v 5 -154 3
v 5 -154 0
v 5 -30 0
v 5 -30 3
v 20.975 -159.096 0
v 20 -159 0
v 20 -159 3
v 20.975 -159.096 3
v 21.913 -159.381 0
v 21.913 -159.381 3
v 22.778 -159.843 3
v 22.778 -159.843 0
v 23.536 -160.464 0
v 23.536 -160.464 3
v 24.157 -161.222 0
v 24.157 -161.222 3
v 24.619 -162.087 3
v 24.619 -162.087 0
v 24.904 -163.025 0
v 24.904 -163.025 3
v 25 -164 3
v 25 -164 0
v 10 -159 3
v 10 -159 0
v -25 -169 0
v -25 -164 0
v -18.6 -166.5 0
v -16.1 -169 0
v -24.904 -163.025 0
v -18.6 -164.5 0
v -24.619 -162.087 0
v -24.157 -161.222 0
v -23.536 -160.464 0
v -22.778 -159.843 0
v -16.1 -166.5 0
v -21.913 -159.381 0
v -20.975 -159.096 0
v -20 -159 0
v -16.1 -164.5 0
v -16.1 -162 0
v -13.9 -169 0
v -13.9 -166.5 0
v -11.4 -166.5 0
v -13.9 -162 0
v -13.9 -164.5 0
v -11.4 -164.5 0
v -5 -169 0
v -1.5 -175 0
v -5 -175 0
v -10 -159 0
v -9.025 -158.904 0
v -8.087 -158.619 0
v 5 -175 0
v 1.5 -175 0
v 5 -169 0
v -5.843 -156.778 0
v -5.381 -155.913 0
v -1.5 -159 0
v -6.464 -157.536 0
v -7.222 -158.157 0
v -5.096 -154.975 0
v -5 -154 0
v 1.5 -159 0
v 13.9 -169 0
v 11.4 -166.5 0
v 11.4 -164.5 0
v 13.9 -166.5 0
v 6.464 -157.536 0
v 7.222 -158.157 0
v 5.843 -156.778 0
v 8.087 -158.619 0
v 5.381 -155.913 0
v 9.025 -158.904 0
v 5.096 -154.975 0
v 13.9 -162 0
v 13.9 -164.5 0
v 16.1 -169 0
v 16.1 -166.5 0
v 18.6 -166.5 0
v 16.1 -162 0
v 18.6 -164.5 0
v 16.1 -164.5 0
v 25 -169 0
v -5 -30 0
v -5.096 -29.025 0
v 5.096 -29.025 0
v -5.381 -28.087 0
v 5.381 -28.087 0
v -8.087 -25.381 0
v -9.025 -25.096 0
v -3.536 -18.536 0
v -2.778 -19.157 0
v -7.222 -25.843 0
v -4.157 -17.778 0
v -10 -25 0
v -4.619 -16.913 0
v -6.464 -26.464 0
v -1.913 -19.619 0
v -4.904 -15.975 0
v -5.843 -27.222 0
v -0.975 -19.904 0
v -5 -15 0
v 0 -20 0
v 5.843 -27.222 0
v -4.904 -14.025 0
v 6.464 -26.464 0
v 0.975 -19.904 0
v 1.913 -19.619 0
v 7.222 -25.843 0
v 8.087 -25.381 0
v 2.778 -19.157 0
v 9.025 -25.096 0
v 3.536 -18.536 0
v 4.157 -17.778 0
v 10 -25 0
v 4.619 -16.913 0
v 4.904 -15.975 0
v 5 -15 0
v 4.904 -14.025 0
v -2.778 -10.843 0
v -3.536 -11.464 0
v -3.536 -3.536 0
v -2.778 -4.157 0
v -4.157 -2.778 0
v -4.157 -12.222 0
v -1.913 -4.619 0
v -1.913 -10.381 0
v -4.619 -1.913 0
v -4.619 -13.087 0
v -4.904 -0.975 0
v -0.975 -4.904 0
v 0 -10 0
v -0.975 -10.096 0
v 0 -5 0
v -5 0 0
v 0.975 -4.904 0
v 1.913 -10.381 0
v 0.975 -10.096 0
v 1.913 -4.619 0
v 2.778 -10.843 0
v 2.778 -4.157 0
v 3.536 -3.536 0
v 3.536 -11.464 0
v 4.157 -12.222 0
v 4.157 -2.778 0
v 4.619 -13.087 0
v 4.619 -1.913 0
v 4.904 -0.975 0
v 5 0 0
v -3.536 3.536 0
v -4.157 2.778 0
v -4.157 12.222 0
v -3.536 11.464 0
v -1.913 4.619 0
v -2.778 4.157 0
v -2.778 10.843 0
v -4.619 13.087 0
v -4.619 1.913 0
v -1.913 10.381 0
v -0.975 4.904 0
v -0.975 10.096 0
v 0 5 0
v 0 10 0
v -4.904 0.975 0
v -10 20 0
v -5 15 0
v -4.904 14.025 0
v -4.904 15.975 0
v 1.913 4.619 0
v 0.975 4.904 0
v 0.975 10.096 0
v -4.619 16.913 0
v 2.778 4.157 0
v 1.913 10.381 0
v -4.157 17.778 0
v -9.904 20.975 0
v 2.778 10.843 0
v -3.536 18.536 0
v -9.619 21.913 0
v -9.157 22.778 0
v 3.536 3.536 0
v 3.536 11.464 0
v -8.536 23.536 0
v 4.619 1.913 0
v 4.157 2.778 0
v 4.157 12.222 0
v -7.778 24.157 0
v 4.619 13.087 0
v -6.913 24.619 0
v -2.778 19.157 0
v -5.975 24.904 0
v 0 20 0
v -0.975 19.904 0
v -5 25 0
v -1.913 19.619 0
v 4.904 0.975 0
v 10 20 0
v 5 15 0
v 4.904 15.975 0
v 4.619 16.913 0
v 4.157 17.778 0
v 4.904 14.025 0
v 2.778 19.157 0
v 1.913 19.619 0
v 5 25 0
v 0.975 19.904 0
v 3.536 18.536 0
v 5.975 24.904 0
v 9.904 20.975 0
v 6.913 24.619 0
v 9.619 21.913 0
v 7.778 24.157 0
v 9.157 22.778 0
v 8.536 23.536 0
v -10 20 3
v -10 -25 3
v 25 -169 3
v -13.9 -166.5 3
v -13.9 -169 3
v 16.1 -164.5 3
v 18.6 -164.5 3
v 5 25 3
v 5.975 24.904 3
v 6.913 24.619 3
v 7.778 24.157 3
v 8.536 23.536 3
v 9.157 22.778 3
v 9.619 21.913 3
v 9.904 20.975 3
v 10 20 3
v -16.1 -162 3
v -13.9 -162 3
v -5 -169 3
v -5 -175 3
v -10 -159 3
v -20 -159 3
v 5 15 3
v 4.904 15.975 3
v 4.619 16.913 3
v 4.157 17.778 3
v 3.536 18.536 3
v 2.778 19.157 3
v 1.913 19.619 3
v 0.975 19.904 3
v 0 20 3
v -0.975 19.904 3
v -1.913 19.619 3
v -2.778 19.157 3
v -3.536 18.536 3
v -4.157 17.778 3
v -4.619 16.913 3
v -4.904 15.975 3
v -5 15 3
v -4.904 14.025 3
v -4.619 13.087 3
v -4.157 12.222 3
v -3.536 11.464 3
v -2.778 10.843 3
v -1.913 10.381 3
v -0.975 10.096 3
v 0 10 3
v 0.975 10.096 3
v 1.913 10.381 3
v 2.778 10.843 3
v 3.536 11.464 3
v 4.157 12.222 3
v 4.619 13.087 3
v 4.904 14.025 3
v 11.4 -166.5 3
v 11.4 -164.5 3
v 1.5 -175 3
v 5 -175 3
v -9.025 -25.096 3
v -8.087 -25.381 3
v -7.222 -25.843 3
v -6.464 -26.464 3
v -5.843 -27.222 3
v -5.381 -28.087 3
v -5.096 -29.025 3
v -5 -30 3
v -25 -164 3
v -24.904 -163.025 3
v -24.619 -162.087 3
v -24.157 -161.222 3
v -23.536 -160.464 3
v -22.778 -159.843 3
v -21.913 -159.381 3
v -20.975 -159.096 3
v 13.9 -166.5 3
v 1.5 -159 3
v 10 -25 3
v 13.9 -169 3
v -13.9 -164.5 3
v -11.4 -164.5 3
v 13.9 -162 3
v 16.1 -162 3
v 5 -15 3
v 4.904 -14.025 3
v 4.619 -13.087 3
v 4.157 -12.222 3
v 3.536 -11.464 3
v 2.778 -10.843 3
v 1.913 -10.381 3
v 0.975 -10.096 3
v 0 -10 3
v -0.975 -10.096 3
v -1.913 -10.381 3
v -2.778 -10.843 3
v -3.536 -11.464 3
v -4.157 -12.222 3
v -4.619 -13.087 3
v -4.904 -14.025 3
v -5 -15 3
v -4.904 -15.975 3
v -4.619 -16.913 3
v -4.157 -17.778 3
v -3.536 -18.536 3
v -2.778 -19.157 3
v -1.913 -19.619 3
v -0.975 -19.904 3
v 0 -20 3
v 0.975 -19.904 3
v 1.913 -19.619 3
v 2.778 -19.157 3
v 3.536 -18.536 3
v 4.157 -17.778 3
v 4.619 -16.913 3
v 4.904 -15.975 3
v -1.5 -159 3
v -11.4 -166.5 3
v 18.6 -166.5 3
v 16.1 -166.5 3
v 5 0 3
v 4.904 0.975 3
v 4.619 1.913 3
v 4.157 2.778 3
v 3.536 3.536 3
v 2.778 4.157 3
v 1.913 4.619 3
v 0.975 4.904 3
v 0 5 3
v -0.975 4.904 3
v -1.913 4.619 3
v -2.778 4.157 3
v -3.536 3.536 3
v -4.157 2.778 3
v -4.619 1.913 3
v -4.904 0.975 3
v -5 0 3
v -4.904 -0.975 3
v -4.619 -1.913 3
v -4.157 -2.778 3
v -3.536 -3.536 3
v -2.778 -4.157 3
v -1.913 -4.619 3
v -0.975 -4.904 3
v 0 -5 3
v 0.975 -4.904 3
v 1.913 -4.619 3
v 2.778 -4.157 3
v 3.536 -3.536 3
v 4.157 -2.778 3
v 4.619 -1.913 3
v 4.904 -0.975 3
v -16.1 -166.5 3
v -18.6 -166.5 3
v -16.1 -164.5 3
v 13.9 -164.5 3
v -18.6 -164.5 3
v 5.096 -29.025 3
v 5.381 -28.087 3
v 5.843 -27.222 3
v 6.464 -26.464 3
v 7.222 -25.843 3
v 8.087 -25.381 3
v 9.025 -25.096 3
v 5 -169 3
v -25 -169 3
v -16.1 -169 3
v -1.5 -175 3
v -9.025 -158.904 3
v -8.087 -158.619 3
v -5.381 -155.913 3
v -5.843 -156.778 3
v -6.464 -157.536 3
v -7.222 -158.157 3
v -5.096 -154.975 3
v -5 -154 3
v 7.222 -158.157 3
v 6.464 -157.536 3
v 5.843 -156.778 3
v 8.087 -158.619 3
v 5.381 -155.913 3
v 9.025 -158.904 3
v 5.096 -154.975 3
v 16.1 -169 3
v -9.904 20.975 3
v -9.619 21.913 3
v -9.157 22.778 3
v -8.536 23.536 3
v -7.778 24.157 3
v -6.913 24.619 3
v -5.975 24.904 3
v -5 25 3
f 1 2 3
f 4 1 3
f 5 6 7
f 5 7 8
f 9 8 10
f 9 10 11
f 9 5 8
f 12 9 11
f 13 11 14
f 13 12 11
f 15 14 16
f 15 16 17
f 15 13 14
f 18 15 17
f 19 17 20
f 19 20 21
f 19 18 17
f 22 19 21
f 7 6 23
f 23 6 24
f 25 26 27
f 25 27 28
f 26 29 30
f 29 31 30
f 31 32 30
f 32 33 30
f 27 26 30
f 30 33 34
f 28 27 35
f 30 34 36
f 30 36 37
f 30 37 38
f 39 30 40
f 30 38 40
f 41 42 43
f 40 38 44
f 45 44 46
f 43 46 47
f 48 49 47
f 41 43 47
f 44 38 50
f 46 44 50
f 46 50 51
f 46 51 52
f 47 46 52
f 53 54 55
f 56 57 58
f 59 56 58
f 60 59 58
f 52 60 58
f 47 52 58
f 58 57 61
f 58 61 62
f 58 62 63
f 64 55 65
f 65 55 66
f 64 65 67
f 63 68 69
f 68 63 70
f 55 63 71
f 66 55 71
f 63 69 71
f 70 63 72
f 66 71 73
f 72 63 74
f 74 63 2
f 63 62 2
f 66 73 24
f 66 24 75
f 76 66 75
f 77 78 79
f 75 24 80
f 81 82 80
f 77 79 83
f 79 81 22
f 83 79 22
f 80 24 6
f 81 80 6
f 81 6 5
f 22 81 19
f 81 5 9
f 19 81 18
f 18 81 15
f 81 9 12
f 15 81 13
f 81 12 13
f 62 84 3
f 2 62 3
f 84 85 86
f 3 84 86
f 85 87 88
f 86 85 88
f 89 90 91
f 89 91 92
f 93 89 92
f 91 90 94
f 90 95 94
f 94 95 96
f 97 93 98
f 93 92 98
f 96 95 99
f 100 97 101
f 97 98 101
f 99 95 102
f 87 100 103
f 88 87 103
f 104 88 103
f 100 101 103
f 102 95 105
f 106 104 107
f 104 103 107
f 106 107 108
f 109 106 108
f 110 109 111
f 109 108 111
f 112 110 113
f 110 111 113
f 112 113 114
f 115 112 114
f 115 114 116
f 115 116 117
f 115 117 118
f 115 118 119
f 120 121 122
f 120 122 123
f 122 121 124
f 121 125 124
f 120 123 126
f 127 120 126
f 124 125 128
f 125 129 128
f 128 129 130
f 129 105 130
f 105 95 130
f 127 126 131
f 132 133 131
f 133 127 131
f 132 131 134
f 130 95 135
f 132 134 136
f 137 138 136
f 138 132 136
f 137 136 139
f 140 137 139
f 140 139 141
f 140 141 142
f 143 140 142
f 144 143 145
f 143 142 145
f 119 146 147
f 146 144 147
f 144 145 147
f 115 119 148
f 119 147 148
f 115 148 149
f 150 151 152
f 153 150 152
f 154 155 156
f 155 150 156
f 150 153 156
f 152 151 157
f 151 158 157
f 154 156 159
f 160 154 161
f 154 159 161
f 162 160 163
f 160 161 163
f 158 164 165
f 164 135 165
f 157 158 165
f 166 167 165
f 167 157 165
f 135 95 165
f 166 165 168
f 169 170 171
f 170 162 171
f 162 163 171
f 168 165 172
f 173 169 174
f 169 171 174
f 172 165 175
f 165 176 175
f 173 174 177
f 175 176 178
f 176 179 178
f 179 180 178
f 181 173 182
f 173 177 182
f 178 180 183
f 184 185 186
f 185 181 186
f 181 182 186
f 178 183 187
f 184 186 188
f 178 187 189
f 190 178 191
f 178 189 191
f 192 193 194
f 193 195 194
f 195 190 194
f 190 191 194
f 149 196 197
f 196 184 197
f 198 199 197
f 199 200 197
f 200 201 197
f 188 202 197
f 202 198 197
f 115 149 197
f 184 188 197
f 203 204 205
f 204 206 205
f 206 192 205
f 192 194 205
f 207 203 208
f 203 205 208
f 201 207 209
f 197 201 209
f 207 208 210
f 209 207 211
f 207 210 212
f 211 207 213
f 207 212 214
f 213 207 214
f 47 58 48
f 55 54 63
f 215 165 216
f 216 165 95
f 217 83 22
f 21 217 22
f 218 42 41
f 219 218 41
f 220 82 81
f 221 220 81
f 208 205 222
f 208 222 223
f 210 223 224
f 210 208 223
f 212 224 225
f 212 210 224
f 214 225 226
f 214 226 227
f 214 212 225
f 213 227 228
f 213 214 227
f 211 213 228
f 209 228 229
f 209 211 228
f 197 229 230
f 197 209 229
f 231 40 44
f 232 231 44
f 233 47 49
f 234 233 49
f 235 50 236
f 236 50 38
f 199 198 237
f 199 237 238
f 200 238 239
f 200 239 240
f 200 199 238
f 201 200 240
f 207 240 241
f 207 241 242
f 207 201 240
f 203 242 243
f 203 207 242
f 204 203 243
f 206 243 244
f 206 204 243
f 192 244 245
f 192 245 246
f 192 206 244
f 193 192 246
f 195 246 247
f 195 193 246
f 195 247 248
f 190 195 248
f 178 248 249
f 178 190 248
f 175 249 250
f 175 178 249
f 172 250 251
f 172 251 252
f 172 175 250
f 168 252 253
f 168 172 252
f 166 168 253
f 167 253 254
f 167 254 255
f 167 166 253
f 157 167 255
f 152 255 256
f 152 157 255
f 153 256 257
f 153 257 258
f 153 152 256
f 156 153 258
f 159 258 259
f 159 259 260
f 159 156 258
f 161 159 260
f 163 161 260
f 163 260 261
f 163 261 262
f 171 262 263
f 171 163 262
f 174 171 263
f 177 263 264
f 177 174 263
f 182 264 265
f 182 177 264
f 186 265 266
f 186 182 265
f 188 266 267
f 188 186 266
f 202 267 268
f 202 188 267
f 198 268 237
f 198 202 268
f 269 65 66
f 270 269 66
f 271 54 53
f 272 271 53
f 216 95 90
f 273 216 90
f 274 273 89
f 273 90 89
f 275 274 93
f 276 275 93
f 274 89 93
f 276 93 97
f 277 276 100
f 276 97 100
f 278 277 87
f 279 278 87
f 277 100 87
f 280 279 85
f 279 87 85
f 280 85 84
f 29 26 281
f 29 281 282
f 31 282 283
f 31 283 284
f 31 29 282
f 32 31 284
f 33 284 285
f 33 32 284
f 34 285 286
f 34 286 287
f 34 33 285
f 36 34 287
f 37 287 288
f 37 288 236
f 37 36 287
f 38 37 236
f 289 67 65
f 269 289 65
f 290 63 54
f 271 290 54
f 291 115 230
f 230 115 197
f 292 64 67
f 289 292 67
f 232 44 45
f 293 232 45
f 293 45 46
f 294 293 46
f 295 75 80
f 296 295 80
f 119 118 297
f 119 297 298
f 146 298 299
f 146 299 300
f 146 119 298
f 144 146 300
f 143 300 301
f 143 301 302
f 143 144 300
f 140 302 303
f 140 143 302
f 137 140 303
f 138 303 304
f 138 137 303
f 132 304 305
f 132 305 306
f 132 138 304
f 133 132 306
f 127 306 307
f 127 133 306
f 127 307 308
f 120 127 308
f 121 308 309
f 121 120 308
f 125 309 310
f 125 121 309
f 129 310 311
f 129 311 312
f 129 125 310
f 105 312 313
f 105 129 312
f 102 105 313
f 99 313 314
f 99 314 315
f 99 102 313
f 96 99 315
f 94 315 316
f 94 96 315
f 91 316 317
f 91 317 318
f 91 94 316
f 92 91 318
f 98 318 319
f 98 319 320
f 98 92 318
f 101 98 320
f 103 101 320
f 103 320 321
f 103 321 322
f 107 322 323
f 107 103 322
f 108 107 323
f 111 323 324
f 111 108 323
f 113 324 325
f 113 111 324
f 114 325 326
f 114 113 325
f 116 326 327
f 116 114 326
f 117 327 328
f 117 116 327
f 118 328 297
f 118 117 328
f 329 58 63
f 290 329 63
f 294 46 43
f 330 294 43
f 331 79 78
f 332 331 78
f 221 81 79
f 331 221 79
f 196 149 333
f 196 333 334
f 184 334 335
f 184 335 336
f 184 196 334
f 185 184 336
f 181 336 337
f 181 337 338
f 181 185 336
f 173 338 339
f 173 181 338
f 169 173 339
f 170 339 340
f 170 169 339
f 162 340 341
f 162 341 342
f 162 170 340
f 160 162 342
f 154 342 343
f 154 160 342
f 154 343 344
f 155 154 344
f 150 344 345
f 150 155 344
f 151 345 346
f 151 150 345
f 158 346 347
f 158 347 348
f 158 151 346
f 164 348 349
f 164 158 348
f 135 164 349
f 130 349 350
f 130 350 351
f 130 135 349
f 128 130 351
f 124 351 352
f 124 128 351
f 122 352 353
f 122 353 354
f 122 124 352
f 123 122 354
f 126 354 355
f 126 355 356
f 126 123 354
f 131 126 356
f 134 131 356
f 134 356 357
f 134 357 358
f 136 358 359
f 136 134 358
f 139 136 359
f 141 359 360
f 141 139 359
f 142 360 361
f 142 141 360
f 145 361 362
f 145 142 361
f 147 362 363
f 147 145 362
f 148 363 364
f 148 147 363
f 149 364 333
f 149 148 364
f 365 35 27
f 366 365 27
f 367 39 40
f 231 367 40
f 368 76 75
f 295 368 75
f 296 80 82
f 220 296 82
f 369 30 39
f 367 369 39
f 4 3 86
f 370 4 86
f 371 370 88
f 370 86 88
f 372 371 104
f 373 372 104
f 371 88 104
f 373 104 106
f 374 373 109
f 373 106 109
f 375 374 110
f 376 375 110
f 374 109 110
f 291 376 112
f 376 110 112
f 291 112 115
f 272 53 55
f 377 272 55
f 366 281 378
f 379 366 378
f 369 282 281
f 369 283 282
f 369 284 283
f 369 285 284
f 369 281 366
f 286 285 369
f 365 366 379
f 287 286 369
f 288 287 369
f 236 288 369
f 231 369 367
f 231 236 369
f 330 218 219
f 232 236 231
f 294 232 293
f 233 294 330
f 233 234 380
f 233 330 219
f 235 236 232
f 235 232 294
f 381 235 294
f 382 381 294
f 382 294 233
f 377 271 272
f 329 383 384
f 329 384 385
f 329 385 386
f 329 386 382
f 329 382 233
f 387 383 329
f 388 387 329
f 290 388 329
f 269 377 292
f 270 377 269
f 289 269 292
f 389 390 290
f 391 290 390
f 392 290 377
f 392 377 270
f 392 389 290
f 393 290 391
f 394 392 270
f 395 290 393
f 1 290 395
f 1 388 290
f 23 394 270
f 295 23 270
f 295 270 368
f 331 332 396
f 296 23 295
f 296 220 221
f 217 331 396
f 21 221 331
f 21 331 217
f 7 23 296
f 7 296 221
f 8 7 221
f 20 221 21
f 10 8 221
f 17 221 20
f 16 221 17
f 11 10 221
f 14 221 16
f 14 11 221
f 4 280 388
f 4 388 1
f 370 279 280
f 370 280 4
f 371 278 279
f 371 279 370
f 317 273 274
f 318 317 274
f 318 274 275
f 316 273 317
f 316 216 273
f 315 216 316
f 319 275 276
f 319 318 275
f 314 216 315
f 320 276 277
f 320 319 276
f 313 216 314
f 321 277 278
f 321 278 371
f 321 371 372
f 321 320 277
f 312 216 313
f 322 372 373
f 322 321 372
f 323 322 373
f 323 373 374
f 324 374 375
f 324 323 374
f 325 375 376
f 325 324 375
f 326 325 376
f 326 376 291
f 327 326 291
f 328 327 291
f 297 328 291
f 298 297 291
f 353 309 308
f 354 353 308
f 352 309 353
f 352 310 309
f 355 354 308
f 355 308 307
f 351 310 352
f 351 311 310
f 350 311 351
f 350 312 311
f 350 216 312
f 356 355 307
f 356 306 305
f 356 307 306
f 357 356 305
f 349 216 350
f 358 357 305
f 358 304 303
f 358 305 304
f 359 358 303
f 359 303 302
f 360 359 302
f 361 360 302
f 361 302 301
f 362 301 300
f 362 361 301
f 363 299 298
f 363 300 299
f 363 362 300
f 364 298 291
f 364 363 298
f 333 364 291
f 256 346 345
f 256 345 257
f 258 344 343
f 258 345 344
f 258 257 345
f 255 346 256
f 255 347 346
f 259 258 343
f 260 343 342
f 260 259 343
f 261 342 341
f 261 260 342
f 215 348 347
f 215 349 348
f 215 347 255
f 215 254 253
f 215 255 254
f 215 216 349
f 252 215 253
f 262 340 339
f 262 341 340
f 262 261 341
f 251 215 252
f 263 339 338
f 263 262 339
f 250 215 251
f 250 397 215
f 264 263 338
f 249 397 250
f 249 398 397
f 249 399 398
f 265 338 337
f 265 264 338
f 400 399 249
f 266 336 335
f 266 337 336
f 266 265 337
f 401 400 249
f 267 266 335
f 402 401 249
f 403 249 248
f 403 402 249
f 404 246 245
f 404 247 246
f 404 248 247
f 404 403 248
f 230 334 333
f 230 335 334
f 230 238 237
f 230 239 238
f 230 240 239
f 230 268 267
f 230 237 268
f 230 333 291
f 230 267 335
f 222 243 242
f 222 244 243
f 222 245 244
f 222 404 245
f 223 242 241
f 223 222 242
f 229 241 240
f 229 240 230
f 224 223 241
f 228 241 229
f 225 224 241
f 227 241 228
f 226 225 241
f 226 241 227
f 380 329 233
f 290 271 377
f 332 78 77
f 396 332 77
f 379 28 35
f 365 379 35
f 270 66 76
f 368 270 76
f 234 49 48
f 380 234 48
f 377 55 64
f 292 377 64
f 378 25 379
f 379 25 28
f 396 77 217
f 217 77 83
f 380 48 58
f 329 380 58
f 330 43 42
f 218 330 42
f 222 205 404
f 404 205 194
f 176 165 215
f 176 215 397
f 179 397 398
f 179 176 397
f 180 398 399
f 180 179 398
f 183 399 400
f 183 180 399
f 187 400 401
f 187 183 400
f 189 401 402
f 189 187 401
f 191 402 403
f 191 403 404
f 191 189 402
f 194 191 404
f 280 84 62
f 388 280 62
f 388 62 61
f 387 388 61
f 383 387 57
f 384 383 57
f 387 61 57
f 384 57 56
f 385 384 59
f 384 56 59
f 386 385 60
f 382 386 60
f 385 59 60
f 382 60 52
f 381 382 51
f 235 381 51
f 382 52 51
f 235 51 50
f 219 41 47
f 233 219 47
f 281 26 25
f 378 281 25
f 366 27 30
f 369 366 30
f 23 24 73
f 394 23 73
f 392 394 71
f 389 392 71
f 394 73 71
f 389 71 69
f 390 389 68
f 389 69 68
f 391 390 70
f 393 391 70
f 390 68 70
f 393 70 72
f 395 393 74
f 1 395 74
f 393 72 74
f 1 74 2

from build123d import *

# Parameters (mm, degrees)
SKETCH1_R           = 5
BOSS_EXTRUDE1_DEPTH = 3
FILLET1_START       = -1
FILLET1_DEPTH       = 5
FILLET1_2_DEPTH     = 3


with BuildPart() as part:
    # Sketch1 → Boss-Extrude1 (new body)
    with BuildSketch(Plane.XY):
        Polygon((-5, -25), (-5, -159), (-25, -159), (-25, -169), (-16.1, -169), (-16.1, -166.5), (-18.6, -166.5), (-18.6, -164.5), (-16.1, -164.5), (-16.1, -162), (-13.9, -162), (-13.9, -164.5), (-11.4, -164.5), (-11.4, -166.5), (-13.9, -166.5), (-13.9, -169), (-5, -169), (-5, -175), (-1.5, -175), (-1.5, -159), (1.5, -159), (1.5, -175), (5, -175), (5, -169), (13.9, -169), (13.9, -166.5), (11.4, -166.5), (11.4, -164.5), (13.9, -164.5), (13.9, -162), (16.1, -162), (16.1, -164.5), (18.6, -164.5), (18.6, -166.5), (16.1, -166.5), (16.1, -169), (25, -169), (25, -159), (5, -159), (5, -25), (10, -25), (10, 25), (-10, 25), (-10, -25), align=None)
        with Locations((0, 15)):
            Circle(SKETCH1_R, mode=Mode.SUBTRACT)
        Circle(SKETCH1_R, mode=Mode.SUBTRACT)
        with Locations((0, -15)):
            Circle(SKETCH1_R, mode=Mode.SUBTRACT)
    extrude(amount=BOSS_EXTRUDE1_DEPTH)

    # Fillet1: read off the stored shape, not the designer's step
    # Fillet1 outline → Fillet1 (cut)
    with BuildSketch(Plane.XY.offset(FILLET1_START)):
        with BuildLine():
            Line((25, -159), (20, -159))
            ThreePointArc((20, -159), (23.535533906, -160.464466094), (25, -164))
            Line((25, -164), (25, -159))
        make_face()
        with BuildLine():
            ThreePointArc((-25, -164), (-23.535533906, -160.464466094), (-20, -159))
            Line((-20, -159), (-25, -159))
            Line((-25, -159), (-25, -164))
        make_face()
        with BuildLine():
            ThreePointArc((-10, 20), (-8.535533906, 23.535533906), (-5, 25))
            Line((-5, 25), (-10, 25))
            Line((-10, 25), (-10, 20))
        make_face()
        with BuildLine():
            ThreePointArc((5, 25), (8.535533906, 23.535533906), (10, 20))
            Line((10, 20), (10, 25))
            Line((10, 25), (5, 25))
        make_face()
    extrude(amount=FILLET1_DEPTH, mode=Mode.SUBTRACT)

    # Fillet1 2 outline → Fillet1 2 (add)
    with BuildSketch(Plane.XY):
        with BuildLine():
            Line((-5, -159), (-5, -154))
            ThreePointArc((-5, -154), (-6.464466094, -157.535533906), (-10, -159))
            Line((-10, -159), (-5, -159))
        make_face()
        with BuildLine():
            Line((-5, -25), (-10, -25))
            ThreePointArc((-10, -25), (-6.464466094, -26.464466094), (-5, -30))
            Line((-5, -30), (-5, -25))
        make_face()
        with BuildLine():
            Line((5, -25), (5, -30))
            ThreePointArc((5, -30), (6.464466094, -26.464466094), (10, -25))
            Line((10, -25), (5, -25))
        make_face()
        with BuildLine():
            Line((5, -159), (10, -159))
            ThreePointArc((10, -159), (6.464466094, -157.535533906), (5, -154))
            Line((5, -154), (5, -159))
        make_face()
    extrude(amount=FILLET1_2_DEPTH)


solid = part.part
